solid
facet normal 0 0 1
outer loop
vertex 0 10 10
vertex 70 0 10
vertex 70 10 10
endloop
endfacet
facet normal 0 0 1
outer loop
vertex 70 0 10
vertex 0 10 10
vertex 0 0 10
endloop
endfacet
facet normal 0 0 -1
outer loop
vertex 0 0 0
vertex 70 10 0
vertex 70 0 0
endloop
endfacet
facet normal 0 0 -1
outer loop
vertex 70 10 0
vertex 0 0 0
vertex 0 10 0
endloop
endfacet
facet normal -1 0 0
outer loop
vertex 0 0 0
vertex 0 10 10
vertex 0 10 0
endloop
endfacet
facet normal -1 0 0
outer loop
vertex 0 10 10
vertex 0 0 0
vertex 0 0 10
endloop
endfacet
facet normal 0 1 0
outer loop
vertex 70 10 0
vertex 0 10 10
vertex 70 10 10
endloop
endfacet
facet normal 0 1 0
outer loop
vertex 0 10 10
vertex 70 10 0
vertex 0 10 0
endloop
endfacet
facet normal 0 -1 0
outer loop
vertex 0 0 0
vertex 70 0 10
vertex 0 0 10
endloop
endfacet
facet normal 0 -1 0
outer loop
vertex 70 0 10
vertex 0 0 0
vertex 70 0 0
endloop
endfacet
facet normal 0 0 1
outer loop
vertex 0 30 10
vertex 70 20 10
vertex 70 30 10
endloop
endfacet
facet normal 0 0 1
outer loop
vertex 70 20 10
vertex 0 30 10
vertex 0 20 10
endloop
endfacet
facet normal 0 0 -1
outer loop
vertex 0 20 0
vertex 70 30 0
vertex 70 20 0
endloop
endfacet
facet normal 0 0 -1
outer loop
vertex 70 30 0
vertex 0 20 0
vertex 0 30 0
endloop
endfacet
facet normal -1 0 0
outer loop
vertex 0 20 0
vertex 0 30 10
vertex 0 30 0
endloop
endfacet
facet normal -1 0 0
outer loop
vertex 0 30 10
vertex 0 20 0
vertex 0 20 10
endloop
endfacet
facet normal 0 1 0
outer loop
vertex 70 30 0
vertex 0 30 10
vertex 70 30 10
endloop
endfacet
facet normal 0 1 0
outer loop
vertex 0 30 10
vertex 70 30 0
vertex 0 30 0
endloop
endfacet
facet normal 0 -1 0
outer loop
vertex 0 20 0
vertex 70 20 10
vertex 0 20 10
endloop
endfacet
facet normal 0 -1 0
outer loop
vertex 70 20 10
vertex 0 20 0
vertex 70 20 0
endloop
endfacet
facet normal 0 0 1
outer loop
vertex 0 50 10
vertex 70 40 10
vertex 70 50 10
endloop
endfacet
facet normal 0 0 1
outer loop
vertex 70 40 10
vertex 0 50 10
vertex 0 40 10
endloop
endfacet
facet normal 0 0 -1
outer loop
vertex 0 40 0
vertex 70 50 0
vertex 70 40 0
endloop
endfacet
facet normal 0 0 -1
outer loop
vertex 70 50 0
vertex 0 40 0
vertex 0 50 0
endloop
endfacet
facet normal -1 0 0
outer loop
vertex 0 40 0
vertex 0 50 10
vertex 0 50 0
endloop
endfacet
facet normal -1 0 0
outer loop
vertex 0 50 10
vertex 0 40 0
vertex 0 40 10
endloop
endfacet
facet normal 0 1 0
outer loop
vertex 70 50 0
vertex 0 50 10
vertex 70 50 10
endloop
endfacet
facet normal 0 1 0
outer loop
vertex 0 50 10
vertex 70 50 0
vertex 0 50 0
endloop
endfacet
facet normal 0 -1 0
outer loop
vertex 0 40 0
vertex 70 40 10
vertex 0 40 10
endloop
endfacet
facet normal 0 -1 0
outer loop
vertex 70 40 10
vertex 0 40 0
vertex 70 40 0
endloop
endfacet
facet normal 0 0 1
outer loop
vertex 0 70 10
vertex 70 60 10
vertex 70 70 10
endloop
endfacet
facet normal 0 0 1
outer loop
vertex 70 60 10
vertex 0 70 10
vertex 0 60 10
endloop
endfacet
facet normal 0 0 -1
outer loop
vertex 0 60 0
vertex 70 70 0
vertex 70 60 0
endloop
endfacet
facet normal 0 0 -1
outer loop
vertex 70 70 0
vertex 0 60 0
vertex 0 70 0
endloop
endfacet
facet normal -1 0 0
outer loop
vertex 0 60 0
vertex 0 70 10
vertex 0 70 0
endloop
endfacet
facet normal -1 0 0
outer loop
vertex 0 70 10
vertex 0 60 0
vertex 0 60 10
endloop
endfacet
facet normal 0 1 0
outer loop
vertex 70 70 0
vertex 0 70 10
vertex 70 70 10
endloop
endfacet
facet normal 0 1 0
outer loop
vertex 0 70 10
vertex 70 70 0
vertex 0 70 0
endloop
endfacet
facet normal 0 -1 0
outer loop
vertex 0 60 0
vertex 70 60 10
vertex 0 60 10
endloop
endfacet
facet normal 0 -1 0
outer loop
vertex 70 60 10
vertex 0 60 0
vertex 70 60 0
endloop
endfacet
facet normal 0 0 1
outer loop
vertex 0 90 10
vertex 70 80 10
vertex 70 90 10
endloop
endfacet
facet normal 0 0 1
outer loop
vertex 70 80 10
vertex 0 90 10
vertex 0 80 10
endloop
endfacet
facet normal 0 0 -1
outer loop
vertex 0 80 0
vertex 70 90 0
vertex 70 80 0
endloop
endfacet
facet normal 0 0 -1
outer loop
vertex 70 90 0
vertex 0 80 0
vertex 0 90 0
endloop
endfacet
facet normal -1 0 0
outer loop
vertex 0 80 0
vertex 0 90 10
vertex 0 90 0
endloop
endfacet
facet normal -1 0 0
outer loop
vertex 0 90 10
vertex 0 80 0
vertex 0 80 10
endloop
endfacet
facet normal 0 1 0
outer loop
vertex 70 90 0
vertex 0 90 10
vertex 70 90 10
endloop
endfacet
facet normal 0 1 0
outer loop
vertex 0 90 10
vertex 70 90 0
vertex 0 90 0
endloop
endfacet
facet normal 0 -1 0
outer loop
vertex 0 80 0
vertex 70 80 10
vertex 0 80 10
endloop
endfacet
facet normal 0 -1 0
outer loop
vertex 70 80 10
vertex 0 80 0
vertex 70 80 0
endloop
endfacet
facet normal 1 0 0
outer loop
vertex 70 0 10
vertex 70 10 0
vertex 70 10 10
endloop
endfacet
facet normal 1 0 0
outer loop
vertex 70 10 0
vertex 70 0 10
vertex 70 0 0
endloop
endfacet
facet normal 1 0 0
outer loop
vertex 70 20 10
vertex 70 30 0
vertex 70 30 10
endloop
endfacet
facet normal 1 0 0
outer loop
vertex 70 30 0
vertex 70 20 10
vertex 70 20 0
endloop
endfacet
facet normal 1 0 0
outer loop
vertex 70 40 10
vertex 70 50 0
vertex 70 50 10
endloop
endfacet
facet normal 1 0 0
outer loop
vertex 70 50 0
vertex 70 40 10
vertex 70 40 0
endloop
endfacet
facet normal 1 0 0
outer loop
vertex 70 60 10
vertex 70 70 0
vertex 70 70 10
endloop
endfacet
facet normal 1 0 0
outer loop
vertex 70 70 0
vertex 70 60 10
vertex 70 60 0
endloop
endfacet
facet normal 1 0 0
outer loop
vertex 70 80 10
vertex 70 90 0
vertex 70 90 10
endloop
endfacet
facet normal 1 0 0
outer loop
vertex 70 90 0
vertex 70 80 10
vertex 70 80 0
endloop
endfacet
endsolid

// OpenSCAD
// Parameters for the grid size and cube size
cube_size = 10;  // Side length of each cube
grid_size_X = 7;   // Grid dimensions (grid_size x grid_size)
grid_size_Y = 9;
module generate_grid() {
    // Generate grid of cubes with alternating colors
    for (x = [0 : (1/(grid_size_X-1)) : (grid_size_X-1)]) {
        for(y = [0 : 2 :grid_size_Y - 1]){
    //        color_ = get_color(1/(grid_size-1), 0, 0);
    //        echo(x);
    //        echo(color_);
            translate([x * cube_size, y * cube_size, 0 * cube_size]) {
                color(c = [ (1/(grid_size_X-1))*x,(1/(grid_size_Y-1))*y,], alpha = 0.5){
                    cube(cube_size);
                }
            }
        }
    }
}
//module colored_cube(x, y, z, color_) {
//    // Translate the cube to the correct position in the grid
//    r=x;
//    translate([x * cube_size, y * cube_size, z * cube_size]) {
//        color(c=[r,0,0], alpha = 0.5) {
//            cube(cube_size);
//        }
//    }
//}
//function get_color(x, y, z) =
//    let (
//        red_max = 1,
//        green_max = 1,
//        blue_max = 1,
//        step_size = 1/(grid_size-1),
//        r = (x + y + z) % (red_max + green_max + blue_max),
//        g = 0,//(y + (r > red_max ? step_size : 0)) % green_max,
//        b = 0//(x + z > (red_max + blue_max) ? step_size : 0)
//    )
//    [r, g, b];

generate_grid(); // Run the grid generation
